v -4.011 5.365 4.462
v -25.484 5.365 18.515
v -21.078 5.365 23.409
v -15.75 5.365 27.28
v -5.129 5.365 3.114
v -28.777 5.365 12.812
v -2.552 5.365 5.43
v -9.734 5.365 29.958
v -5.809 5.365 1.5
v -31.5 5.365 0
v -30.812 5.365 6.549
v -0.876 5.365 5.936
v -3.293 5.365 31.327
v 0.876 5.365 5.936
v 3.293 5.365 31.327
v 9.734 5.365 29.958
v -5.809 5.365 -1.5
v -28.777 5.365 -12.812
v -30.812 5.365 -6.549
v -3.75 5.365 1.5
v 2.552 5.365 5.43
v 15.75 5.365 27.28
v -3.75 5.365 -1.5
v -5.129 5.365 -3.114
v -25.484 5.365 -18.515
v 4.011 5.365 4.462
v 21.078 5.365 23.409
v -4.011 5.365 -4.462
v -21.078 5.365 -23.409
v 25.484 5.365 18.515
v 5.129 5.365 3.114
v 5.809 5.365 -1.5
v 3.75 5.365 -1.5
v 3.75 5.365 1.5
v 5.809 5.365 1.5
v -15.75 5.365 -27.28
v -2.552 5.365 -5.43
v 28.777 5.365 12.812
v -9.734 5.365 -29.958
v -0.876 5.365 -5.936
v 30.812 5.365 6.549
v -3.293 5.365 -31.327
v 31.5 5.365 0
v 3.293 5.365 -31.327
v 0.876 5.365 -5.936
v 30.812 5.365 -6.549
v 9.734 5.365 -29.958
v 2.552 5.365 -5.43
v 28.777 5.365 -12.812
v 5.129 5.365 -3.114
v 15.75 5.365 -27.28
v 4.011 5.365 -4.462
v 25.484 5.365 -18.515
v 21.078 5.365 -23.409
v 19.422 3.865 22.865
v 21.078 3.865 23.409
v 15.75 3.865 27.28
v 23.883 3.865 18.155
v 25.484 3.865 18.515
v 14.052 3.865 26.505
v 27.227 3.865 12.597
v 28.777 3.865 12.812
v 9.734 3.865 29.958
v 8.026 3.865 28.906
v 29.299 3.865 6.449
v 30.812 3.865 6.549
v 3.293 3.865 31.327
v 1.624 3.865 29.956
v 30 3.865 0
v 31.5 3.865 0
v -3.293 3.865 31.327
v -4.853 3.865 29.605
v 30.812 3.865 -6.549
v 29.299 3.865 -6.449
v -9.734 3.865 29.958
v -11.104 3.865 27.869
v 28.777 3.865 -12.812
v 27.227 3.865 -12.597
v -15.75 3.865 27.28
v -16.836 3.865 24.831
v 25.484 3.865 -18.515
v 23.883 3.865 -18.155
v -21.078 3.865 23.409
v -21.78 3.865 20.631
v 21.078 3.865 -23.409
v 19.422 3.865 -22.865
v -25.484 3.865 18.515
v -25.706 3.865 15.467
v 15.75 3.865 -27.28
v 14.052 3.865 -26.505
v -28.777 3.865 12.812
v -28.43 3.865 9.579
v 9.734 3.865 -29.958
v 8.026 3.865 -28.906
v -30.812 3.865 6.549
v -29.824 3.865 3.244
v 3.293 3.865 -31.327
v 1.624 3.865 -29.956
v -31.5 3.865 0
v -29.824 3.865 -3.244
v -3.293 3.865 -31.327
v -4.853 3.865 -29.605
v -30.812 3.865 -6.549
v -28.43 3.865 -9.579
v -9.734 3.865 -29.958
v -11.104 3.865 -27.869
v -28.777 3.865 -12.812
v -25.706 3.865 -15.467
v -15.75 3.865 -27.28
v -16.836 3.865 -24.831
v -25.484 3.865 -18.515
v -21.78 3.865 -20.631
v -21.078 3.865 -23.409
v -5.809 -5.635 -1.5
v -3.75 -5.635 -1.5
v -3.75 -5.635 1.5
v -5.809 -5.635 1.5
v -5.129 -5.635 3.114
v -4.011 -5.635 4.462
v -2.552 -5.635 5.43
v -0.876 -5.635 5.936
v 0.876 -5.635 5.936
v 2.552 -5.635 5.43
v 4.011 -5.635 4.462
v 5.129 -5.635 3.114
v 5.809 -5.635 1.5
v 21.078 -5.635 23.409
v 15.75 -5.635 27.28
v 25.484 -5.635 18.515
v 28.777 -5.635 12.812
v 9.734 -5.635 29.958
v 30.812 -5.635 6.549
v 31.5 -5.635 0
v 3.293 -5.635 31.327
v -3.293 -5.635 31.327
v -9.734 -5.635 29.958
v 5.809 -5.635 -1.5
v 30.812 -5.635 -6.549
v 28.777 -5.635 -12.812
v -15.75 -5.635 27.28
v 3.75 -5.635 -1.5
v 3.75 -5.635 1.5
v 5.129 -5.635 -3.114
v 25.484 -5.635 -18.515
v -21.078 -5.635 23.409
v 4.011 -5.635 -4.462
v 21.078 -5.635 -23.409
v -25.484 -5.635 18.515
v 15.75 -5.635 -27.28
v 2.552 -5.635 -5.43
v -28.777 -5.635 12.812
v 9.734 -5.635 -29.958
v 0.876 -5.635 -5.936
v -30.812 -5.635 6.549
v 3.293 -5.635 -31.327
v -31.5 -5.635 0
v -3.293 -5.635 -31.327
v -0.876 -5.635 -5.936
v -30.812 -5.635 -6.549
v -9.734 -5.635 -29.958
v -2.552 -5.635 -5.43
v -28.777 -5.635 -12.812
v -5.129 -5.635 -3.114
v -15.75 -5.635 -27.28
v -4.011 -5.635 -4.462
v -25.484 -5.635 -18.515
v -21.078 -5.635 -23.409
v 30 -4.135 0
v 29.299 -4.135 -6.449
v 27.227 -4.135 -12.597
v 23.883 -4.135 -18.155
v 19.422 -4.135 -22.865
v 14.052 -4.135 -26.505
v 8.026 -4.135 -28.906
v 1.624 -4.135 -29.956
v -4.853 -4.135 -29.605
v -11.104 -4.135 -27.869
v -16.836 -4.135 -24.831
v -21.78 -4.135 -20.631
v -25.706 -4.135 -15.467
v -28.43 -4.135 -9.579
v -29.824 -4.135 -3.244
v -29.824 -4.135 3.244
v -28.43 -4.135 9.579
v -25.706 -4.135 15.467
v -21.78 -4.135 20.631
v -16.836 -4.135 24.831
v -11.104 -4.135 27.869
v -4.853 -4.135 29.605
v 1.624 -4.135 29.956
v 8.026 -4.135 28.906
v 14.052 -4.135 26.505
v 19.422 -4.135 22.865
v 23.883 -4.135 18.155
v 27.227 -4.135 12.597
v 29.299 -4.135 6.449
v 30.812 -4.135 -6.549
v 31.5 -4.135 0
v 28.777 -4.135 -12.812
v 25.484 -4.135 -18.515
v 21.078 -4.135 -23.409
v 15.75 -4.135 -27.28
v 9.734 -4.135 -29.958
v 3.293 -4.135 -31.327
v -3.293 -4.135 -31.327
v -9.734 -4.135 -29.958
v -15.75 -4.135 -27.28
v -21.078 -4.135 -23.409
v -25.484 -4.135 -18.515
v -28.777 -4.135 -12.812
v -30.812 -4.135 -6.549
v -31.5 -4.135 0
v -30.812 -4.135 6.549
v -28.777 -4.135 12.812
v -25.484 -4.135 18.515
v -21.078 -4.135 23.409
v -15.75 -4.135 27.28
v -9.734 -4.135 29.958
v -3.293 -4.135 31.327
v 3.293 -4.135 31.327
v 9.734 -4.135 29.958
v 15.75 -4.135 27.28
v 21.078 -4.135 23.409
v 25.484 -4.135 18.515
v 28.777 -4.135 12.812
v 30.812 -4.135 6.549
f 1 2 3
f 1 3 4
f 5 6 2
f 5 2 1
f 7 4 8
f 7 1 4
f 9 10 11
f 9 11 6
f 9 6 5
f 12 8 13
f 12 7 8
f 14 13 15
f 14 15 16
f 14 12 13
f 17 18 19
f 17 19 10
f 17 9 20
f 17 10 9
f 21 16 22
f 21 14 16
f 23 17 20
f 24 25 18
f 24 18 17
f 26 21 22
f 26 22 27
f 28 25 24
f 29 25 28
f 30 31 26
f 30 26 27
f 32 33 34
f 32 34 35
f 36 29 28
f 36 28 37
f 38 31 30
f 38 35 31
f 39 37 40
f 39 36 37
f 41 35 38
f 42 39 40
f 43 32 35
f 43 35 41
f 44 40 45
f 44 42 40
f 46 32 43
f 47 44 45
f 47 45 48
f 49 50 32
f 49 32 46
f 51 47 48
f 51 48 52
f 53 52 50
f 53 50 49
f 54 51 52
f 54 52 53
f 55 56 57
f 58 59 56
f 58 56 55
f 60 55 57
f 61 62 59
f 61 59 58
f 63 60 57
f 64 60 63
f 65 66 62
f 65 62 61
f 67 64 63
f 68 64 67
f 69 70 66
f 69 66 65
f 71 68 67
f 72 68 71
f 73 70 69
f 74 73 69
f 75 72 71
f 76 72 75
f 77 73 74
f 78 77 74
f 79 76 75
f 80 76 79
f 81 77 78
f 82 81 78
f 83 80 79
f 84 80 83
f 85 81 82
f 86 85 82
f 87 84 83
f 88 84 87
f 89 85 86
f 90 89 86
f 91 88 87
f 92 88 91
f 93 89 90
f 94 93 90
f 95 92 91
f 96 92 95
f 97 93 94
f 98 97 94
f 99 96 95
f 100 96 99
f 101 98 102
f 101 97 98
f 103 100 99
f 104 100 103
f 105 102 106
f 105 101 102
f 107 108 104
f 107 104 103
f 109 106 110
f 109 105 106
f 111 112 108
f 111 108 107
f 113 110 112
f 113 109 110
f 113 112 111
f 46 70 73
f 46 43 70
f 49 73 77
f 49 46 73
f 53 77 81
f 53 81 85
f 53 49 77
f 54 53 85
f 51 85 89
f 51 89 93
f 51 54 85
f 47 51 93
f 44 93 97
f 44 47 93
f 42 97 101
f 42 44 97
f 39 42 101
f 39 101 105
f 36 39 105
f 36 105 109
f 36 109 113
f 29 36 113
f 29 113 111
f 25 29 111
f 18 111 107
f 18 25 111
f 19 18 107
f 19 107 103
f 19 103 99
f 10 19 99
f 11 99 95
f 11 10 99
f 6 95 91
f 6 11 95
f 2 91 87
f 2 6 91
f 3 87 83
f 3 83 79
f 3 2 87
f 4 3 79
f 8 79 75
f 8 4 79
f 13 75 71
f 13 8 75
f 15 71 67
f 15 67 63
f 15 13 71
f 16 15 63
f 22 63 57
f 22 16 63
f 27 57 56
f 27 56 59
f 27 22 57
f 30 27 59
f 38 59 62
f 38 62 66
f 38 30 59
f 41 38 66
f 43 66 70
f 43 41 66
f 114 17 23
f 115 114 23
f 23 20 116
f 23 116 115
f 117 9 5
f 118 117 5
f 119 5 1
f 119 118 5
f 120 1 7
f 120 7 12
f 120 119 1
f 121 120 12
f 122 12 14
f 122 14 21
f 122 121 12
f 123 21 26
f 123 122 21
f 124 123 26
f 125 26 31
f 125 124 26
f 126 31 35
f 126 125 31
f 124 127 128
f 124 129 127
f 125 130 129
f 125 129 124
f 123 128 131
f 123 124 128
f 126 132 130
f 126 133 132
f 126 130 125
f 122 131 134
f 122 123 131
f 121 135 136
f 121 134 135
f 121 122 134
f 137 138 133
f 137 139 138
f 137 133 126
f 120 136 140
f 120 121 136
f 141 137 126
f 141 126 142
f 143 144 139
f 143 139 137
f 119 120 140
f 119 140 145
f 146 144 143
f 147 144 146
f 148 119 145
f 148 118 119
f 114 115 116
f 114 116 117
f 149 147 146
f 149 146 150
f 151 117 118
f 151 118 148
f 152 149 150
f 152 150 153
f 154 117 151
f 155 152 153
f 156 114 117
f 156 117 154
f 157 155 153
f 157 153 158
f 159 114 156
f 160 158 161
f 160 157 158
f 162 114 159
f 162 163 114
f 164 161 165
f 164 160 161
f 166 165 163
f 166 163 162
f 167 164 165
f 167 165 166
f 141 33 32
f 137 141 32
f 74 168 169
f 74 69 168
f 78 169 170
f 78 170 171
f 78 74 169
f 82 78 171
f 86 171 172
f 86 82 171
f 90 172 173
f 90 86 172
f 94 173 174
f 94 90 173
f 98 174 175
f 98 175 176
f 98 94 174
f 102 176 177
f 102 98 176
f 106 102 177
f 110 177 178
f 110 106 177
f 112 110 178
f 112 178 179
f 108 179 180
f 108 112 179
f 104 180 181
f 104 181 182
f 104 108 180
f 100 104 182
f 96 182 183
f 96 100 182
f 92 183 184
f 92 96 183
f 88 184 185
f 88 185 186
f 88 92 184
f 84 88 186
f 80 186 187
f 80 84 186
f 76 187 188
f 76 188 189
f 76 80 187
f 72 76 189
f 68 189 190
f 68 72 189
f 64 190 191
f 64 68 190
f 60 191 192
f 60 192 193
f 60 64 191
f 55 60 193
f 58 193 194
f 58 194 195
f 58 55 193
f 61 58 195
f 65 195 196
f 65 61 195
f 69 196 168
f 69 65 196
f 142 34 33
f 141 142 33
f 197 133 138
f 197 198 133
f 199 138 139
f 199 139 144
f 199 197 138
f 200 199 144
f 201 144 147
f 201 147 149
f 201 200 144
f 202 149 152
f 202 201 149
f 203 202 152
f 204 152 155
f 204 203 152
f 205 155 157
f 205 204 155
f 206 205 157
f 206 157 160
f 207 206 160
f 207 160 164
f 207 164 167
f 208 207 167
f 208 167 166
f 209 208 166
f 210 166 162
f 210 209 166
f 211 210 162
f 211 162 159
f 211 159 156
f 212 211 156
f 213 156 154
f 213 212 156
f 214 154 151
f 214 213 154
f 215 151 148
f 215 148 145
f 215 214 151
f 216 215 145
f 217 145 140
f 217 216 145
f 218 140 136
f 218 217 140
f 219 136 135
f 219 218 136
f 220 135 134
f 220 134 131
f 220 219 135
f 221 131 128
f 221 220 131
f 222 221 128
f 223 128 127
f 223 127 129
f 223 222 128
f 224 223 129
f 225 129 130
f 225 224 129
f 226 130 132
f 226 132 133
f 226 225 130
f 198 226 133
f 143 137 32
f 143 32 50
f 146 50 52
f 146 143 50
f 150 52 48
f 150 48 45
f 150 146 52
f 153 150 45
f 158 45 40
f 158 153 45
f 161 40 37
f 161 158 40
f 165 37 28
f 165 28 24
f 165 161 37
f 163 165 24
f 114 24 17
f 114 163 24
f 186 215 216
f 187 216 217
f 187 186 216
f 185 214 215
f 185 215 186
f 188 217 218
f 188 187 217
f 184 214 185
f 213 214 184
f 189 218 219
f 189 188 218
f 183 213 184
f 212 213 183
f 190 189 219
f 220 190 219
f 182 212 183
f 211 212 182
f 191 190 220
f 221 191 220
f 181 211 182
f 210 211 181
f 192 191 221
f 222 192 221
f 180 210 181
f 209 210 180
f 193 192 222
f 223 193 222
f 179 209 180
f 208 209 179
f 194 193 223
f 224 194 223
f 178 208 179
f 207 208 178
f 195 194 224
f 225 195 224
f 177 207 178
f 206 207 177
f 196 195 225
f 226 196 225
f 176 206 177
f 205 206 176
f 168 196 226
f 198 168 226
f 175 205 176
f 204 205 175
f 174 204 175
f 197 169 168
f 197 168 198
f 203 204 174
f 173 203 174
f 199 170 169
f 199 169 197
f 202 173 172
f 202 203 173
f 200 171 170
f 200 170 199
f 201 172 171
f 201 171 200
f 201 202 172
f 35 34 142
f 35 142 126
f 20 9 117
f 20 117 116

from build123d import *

# Parameters (mm, degrees)
ESQUISSE6_W        = 4.5
ESQUISSE6_H        = 3
BOSS_EXTRU_1_DEPTH = 11


with BuildPart() as part:
    # Esquisse2 → Révolution1 (revolve)
    with BuildSketch(Plane.XY):
        Polygon((6, 5.365286165), (6, -5.634713835), (31.5, -5.634713835), (31.5, -4.134713835), (30, -4.134713835), (30, 3.865286165), (31.5, 3.865286165), (31.5, 5.365286165), align=None)
    revolve(axis=Axis((0, 0, 0), (0, 1, 0)))

    # Esquisse6 → Boss.-Extru.1 (add)
    with BuildSketch(Plane(origin=(0, 5.365286165, 0), x_dir=(1, 0, 0), z_dir=(0, 1, 0))):
        with Locations((-6, 0)):
            Rectangle(ESQUISSE6_W, ESQUISSE6_H)
        with Locations((6, 0)):
            Rectangle(ESQUISSE6_W, ESQUISSE6_H)
    extrude(amount=-BOSS_EXTRU_1_DEPTH)


solid = part.part
